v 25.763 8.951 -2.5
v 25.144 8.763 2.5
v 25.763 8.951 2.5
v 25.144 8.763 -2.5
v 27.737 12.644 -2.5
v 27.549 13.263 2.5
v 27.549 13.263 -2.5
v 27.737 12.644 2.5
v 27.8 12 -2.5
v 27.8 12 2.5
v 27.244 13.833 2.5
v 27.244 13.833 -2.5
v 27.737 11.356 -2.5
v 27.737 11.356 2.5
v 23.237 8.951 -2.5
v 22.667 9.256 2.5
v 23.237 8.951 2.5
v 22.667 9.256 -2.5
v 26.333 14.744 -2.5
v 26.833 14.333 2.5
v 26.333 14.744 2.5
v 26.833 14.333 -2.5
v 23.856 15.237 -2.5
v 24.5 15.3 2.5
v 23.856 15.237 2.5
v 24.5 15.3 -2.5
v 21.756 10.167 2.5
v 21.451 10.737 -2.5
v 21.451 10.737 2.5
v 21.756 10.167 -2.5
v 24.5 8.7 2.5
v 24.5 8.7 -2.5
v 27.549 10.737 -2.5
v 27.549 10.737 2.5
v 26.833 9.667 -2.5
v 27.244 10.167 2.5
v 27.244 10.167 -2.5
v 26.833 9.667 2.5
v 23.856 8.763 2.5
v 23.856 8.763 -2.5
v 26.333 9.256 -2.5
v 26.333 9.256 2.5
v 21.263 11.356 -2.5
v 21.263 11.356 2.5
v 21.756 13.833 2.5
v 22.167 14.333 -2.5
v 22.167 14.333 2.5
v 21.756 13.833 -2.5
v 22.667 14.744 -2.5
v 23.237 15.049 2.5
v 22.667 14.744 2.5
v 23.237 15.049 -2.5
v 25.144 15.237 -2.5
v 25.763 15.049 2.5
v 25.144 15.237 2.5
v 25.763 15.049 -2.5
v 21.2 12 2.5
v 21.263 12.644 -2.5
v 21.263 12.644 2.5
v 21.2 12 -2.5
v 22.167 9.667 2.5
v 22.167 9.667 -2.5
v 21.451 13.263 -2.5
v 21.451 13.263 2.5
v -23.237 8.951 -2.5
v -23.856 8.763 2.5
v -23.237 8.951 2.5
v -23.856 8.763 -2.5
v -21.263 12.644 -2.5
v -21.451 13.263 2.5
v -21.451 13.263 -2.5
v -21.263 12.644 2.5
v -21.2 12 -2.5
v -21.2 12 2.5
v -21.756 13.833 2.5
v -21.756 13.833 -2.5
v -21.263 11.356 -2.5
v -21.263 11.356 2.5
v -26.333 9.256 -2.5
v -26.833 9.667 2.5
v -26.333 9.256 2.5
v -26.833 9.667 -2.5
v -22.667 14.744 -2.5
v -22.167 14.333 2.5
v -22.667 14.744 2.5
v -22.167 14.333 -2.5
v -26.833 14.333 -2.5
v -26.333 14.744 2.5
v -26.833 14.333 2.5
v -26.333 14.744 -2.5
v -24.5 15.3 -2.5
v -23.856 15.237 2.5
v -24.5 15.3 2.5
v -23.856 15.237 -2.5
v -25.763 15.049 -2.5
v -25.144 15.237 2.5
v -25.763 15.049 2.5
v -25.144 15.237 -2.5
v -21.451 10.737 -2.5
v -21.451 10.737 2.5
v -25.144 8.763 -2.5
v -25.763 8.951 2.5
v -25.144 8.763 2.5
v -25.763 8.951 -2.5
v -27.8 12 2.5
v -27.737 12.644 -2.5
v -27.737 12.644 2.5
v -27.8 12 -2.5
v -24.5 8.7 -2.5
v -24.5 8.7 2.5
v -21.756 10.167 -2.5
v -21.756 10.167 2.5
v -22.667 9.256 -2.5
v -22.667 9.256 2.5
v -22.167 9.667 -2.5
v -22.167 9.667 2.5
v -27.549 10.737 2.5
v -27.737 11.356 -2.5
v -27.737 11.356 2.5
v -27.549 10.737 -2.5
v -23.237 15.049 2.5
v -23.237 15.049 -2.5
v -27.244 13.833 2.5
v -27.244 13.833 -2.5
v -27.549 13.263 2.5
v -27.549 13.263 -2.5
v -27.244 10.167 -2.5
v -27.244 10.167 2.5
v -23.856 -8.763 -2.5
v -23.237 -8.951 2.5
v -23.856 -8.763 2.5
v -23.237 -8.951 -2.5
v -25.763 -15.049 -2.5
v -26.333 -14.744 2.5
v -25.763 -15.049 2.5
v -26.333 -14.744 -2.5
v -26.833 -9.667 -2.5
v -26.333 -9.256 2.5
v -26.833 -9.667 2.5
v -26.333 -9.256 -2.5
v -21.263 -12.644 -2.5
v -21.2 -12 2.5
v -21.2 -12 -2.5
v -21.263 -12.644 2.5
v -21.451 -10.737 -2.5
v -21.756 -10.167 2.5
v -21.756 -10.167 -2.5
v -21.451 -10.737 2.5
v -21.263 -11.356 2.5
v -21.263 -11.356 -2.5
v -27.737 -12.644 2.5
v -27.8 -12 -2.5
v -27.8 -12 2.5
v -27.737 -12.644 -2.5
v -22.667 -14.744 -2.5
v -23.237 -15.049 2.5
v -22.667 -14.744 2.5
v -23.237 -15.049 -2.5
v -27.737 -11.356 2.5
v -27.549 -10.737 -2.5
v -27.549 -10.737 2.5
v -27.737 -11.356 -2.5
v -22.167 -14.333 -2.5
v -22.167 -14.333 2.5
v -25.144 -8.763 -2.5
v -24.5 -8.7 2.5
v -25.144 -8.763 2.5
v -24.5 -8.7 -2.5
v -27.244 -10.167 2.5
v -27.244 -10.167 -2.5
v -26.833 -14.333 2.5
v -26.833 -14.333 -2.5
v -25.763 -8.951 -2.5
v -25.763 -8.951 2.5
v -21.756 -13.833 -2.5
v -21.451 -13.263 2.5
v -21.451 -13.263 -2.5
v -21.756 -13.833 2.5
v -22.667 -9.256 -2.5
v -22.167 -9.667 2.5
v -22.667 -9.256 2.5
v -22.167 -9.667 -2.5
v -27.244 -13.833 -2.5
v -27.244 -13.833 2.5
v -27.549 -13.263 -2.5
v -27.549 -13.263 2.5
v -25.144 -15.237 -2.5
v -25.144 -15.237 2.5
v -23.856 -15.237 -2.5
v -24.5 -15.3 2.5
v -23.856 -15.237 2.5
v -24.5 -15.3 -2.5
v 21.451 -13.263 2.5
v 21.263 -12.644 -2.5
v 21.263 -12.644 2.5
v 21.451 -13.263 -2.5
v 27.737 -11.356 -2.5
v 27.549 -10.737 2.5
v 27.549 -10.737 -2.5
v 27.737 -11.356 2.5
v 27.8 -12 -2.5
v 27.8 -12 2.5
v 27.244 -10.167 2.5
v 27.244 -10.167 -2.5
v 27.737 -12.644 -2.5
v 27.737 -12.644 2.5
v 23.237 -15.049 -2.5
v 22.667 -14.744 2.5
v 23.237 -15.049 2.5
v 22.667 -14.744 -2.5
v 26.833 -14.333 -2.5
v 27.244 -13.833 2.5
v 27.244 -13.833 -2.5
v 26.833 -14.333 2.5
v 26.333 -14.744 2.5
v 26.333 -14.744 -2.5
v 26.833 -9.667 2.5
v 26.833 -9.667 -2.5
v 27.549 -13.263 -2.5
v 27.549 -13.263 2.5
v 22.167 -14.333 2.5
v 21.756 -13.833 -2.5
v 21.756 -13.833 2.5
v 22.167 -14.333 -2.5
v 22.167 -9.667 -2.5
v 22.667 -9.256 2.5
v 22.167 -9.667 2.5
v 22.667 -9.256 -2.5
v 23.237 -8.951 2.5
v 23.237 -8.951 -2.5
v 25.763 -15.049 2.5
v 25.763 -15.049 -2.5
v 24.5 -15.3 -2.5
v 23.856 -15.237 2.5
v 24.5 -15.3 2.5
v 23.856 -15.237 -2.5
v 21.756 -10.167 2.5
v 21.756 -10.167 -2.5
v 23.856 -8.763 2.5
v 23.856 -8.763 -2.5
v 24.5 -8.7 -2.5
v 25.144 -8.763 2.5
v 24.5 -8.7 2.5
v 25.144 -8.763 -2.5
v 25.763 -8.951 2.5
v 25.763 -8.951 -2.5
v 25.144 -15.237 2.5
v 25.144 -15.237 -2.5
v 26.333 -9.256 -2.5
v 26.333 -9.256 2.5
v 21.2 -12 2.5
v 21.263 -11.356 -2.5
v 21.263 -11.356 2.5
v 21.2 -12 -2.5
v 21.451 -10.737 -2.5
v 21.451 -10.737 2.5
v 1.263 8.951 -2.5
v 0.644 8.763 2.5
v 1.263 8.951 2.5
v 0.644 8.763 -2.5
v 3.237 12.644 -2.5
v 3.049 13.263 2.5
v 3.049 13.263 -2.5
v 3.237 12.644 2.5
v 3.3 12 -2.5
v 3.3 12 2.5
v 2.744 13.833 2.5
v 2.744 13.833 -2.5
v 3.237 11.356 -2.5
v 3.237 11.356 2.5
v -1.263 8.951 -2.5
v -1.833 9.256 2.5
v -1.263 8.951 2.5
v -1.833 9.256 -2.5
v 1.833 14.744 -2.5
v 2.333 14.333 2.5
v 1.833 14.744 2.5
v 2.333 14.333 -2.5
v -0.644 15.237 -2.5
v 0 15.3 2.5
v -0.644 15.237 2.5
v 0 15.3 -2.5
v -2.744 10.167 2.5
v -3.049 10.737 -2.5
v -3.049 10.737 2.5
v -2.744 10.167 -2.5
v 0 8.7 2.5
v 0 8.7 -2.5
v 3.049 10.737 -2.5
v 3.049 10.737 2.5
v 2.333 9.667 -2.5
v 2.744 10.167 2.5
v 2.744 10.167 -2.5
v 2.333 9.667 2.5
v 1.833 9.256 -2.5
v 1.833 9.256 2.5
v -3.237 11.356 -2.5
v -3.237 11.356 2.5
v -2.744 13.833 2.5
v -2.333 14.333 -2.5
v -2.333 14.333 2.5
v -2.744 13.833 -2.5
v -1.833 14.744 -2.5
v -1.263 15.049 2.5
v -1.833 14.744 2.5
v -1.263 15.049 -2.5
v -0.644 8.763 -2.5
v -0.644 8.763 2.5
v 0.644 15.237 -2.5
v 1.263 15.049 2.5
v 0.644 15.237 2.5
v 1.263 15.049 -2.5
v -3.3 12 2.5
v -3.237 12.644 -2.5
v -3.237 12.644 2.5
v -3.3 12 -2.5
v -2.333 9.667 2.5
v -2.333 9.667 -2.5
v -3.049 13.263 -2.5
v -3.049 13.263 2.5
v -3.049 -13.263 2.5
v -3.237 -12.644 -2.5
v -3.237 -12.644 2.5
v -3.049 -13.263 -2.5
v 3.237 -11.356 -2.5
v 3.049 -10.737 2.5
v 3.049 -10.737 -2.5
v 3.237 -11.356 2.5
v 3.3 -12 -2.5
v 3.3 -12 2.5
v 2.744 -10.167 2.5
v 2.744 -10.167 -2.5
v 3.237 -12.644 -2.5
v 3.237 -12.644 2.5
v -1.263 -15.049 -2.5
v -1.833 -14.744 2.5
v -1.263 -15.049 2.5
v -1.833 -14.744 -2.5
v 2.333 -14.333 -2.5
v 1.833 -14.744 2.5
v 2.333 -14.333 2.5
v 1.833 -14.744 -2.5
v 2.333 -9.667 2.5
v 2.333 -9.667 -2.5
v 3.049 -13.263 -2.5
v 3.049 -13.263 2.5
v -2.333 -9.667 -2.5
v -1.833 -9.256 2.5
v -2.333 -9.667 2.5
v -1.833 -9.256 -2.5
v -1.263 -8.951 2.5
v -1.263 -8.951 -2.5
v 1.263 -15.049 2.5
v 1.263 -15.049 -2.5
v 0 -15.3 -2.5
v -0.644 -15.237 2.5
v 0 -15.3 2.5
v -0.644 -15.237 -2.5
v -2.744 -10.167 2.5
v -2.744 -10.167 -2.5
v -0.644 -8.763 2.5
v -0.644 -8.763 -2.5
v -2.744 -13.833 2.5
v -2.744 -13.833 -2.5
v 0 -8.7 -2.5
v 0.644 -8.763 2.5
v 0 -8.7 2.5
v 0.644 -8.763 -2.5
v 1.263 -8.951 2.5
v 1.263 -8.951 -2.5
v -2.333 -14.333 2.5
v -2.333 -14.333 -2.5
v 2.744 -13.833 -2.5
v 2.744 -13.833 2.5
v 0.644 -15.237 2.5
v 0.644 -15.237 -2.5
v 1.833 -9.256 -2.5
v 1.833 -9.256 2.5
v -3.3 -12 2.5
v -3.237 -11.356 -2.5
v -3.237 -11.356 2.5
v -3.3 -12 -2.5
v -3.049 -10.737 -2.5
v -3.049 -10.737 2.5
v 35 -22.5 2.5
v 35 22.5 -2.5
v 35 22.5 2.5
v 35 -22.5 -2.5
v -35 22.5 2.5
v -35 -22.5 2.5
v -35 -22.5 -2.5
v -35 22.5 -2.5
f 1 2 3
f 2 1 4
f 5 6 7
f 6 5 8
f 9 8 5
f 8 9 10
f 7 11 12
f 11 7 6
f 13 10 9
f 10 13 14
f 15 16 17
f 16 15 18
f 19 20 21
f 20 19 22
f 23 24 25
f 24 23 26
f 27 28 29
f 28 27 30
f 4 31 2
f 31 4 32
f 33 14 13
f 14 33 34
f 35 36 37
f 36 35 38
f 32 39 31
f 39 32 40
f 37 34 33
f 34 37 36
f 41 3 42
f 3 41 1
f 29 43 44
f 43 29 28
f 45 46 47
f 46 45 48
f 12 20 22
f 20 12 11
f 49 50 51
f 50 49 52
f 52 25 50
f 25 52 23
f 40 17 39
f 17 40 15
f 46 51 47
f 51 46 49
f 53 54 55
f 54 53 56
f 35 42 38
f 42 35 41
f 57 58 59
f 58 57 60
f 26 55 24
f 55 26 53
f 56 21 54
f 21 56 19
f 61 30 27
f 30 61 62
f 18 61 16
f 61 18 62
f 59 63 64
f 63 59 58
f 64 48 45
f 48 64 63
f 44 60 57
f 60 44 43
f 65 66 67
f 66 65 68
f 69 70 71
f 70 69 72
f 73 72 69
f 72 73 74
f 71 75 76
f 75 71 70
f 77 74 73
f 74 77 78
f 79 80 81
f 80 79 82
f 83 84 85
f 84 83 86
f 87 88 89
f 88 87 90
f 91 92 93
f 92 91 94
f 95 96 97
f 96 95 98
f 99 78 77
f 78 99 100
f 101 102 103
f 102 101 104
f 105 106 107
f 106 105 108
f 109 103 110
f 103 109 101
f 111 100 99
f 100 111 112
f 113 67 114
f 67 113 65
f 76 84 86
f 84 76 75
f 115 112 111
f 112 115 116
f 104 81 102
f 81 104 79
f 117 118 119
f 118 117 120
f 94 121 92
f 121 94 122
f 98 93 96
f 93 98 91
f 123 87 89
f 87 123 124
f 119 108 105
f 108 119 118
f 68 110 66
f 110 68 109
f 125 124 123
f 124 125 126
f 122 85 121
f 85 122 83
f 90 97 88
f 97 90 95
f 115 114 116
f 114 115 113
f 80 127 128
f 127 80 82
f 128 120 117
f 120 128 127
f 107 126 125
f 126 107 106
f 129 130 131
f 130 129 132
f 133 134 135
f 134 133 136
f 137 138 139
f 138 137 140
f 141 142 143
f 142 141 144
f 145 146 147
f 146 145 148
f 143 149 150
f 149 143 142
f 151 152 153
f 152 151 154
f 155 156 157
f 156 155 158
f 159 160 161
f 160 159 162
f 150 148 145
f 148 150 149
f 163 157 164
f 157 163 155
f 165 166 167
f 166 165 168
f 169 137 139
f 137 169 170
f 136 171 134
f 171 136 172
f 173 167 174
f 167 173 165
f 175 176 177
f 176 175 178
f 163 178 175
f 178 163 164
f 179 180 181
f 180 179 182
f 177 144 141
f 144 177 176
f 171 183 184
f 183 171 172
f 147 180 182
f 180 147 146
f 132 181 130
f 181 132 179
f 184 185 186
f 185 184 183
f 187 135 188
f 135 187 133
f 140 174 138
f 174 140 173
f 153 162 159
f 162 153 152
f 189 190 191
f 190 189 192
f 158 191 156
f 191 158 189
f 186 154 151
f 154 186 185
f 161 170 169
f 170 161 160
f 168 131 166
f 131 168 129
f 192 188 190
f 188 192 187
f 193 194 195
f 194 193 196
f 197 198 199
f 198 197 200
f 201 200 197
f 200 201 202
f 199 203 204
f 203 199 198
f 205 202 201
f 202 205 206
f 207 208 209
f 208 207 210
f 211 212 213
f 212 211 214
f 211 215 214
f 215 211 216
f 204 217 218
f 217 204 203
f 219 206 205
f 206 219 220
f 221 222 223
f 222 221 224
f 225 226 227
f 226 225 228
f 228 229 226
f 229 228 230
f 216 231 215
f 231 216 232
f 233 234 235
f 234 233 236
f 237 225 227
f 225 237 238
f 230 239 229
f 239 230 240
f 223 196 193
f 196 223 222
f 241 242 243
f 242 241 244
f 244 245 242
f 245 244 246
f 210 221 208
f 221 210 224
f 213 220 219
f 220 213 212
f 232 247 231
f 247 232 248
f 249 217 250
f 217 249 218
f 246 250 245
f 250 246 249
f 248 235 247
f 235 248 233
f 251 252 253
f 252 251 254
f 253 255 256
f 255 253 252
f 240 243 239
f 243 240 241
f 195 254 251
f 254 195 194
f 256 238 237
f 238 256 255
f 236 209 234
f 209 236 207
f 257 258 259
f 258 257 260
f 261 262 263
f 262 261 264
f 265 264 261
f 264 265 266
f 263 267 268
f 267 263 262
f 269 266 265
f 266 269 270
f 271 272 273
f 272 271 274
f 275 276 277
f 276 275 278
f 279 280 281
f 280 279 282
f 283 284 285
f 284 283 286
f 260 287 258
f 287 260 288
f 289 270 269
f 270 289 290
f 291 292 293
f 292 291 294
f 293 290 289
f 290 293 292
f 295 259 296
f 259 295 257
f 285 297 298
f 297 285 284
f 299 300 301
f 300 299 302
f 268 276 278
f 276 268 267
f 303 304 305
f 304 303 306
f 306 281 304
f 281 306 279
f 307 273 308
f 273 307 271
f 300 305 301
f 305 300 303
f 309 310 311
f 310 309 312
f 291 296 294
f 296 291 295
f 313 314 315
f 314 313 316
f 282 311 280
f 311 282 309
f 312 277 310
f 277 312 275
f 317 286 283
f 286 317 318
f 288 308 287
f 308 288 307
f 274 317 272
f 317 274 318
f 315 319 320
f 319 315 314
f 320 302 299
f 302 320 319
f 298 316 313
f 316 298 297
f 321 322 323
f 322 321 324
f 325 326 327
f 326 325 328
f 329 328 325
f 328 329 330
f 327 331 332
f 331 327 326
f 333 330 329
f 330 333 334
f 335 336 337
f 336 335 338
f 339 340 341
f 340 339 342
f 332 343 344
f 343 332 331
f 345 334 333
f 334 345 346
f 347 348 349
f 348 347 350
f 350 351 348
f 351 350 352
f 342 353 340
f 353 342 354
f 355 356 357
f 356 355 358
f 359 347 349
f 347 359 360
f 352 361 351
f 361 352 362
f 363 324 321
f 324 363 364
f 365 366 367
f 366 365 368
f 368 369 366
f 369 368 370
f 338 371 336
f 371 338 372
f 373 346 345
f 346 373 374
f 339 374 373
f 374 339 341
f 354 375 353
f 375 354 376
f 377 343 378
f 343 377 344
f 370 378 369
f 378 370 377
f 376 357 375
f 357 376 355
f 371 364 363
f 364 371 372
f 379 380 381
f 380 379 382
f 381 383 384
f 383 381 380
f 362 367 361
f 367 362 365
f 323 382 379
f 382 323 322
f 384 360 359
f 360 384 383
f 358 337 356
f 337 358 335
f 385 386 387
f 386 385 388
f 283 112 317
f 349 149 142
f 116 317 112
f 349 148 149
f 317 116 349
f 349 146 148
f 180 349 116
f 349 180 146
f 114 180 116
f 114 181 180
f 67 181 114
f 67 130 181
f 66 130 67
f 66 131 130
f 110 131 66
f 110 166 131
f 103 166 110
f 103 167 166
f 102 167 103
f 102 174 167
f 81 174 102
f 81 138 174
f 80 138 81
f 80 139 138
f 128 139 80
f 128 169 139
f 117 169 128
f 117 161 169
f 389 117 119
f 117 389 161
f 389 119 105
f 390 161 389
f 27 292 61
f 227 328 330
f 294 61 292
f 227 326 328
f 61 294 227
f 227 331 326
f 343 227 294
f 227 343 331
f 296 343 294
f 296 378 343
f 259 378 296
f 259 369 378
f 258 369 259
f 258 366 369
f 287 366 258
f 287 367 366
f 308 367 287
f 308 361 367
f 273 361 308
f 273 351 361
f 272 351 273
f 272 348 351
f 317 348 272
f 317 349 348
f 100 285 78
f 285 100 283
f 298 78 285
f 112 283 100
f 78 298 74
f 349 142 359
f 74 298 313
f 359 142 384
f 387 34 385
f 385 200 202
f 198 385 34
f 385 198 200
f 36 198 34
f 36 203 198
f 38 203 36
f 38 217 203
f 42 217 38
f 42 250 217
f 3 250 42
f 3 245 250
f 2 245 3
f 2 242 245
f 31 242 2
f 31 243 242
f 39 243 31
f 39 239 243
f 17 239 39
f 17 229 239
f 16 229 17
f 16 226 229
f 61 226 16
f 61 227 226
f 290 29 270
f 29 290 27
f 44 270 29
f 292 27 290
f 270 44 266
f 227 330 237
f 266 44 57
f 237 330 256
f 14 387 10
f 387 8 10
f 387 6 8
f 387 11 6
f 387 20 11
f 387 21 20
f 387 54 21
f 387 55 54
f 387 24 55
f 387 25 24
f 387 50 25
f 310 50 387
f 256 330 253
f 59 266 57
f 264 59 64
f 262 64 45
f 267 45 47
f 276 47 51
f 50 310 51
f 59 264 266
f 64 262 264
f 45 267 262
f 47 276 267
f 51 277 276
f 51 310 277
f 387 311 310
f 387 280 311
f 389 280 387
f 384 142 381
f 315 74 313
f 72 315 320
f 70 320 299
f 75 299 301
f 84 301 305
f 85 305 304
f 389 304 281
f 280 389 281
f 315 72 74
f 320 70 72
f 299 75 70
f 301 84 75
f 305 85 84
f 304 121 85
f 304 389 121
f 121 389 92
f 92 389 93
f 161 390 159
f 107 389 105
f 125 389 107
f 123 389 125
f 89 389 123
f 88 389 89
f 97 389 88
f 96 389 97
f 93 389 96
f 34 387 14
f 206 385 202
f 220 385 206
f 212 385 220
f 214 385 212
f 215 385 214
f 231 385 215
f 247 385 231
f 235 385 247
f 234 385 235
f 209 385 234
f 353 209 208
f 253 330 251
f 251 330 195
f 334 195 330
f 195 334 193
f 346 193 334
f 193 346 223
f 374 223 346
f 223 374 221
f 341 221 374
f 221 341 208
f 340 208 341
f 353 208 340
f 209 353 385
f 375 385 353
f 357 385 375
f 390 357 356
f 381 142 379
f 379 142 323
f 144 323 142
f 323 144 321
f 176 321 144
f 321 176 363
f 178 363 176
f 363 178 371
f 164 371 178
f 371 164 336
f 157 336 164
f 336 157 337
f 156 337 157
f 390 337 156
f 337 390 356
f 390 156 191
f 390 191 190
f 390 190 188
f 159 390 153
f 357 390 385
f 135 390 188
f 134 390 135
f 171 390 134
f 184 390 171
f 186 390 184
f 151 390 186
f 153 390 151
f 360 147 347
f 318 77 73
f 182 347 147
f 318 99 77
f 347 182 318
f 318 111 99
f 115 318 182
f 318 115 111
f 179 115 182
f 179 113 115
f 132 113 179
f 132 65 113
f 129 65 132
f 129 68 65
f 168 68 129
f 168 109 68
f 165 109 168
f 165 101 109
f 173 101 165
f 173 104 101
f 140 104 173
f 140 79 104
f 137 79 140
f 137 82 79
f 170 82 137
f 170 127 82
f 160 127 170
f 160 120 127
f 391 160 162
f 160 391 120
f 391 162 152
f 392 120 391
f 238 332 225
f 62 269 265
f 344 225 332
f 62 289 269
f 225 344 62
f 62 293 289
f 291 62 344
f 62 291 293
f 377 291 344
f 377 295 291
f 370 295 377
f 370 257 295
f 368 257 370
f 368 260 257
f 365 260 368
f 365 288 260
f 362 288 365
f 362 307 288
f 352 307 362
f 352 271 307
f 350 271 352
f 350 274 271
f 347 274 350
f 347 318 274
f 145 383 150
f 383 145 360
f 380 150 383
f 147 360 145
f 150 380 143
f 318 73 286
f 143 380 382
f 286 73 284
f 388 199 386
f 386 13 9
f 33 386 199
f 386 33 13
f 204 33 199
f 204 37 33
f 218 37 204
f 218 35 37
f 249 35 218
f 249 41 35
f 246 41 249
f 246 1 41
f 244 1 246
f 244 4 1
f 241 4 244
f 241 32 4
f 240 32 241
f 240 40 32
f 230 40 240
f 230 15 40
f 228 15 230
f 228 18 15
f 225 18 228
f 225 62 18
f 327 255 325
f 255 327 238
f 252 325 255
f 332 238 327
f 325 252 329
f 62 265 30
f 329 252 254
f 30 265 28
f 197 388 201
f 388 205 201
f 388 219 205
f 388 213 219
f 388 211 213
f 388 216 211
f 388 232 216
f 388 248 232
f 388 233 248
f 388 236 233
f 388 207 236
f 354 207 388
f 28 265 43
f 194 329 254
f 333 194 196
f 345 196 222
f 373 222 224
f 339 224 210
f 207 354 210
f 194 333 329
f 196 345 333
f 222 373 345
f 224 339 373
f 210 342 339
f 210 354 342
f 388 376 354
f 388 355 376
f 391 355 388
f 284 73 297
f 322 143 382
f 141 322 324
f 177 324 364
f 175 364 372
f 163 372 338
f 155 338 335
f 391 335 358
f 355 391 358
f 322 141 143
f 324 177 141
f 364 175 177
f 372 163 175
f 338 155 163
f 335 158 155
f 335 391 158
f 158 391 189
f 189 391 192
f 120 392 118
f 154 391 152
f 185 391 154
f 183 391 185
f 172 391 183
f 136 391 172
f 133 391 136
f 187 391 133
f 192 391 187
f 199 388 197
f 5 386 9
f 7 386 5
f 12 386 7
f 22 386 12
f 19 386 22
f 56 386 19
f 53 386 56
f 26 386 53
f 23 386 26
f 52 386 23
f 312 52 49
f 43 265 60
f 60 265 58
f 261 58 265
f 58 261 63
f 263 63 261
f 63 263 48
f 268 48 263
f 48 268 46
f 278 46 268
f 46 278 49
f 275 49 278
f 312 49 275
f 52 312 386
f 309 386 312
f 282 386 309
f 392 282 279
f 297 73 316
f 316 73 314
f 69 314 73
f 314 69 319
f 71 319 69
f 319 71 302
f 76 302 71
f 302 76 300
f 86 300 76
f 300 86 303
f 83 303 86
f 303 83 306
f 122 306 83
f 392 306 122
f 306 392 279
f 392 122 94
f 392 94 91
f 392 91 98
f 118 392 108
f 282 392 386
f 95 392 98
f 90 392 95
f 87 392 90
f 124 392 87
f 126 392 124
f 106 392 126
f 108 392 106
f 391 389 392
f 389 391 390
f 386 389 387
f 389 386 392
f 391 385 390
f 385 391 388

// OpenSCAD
$fn = 32;

// ----------------------------------------------------------------------
// Corner plate 70 x 45 x 5
// 6 holes, centres taken from the edge offset
// ----------------------------------------------------------------------

// --- parameters (mm) ---
plate = [70, 45, 5];  // overall size (x, y, z)
holes = 6;            // number of holes the drawing asks for
hole_d = 6.6;         // hole diameter
edge = 10.5;          // hole centre offset from the plate edge

// --- derived feature positions (mm) ---
corner_x = plate[0] / 2 - edge;  // = 24.5   corner hole X
corner_y = plate[1] / 2 - edge;  // = 12   corner hole Y
feature_centers = [
  [corner_x, corner_y],
  [-corner_x, corner_y],
  [-corner_x, -corner_y],
  [corner_x, -corner_y],
  [0, corner_y],
  [0, -corner_y]
];   // hole centres the loop below drills

// plate outline, every hole drilled through with the same cutters
difference() {
  cube(plate, center = true);
  for (centre = feature_centers)
    translate([centre[0], centre[1], 0])
      cylinder(d = hole_d, h = plate[2] + 2, center = true);
}
